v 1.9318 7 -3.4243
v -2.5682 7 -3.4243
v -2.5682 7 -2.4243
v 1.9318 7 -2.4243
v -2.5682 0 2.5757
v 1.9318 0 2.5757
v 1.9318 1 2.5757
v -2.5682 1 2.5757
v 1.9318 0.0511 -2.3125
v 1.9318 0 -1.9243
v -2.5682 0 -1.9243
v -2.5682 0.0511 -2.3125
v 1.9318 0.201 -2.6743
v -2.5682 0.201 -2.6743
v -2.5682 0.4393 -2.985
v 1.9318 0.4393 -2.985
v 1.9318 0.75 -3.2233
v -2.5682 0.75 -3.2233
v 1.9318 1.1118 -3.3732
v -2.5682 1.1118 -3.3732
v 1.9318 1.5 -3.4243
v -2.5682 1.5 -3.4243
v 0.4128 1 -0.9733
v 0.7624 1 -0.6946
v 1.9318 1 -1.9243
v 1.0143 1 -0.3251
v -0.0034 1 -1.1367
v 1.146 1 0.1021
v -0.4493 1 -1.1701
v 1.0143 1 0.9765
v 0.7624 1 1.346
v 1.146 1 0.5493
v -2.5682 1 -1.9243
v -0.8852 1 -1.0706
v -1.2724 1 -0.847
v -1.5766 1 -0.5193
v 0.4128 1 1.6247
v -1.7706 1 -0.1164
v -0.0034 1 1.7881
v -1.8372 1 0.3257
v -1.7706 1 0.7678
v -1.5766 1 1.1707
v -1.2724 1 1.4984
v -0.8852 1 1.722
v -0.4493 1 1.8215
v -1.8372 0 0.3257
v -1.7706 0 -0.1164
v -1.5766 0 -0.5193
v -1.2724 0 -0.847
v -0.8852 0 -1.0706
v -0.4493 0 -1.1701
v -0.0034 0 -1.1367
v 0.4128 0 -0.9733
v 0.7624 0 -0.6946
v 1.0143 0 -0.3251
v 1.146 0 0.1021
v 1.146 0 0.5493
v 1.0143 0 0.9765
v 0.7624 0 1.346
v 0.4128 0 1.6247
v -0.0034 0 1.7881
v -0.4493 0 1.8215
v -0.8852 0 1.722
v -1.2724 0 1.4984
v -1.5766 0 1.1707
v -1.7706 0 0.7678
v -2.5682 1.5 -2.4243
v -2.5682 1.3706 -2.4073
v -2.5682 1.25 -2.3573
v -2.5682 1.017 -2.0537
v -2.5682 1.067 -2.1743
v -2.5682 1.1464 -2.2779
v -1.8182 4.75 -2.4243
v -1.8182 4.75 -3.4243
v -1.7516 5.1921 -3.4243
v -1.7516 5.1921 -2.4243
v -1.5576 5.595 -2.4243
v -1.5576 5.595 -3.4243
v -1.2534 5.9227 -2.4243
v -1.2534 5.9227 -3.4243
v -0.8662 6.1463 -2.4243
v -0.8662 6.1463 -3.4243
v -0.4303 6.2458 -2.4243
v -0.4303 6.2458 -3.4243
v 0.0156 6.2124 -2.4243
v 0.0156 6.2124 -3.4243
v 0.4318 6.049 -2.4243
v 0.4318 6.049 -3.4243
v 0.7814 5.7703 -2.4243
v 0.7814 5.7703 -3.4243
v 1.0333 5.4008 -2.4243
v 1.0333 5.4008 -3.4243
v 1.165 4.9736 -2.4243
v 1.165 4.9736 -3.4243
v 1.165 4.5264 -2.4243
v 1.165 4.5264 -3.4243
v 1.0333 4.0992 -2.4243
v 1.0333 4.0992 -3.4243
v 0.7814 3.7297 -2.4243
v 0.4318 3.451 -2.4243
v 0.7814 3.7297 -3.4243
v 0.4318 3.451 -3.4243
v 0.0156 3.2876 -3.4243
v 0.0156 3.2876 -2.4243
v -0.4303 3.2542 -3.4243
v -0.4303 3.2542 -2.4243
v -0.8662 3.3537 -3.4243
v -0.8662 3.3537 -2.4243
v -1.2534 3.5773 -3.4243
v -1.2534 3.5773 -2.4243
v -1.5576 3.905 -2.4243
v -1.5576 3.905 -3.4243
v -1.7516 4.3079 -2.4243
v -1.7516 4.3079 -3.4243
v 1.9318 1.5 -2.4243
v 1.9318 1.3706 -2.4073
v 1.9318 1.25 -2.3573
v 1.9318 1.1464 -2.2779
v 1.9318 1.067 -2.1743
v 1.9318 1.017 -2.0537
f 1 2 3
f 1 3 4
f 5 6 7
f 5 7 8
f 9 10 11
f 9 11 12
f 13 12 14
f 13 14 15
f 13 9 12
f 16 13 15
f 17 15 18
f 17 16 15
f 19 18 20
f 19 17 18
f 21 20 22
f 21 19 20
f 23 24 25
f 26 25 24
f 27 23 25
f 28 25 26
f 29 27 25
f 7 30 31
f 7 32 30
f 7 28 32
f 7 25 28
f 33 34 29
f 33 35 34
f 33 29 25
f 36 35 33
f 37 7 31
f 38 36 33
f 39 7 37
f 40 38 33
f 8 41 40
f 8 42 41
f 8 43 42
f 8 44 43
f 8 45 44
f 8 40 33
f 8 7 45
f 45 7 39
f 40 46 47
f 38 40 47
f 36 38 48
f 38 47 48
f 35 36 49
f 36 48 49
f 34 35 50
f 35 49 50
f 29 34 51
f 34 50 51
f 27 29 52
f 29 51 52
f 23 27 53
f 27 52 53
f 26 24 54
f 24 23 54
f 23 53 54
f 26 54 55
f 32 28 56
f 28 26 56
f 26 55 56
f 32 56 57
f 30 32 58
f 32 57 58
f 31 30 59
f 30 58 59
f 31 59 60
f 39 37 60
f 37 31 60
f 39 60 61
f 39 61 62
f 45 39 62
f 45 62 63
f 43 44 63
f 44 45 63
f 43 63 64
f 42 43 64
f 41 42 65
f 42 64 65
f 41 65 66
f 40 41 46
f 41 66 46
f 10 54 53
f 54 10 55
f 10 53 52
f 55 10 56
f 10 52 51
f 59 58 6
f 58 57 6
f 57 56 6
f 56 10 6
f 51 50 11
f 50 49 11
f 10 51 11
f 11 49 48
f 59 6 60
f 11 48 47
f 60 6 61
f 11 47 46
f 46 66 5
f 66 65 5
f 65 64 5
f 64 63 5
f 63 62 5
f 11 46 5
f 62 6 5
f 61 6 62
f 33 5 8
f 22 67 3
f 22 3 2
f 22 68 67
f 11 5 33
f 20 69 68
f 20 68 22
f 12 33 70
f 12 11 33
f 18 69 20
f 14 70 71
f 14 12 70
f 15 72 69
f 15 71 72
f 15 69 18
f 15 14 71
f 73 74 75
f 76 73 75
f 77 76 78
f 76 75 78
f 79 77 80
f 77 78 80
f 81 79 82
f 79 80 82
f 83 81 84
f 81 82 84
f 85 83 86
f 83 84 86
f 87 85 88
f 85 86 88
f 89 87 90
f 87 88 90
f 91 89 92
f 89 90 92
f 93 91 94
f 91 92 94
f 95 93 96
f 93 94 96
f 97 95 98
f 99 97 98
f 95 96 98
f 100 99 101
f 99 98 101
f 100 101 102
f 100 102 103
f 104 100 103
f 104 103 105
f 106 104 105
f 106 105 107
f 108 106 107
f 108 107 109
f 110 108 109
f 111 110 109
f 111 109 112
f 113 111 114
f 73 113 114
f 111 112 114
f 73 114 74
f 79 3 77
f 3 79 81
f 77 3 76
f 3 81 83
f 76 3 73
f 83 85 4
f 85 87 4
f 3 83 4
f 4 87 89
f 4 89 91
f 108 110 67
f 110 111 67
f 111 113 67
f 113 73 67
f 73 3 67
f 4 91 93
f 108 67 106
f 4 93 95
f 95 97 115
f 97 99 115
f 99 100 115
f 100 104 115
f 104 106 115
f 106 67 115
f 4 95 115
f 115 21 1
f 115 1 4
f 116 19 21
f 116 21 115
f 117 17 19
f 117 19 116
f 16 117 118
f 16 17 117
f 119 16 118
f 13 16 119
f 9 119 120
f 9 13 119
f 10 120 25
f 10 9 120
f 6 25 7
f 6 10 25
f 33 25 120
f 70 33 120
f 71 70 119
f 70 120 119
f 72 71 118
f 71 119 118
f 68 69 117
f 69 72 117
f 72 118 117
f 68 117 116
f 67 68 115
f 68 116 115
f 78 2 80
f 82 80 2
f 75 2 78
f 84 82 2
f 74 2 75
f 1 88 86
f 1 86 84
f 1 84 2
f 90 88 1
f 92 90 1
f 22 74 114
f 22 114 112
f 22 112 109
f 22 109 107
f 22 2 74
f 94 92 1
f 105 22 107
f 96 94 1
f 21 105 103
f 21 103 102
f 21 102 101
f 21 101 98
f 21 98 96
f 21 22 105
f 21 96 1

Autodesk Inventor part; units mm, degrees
ref_plane "YZ Plane" through (0, 0, 0) normal (1, 0, 0) x (0, 1, 0)
ref_plane "XZ Plane" through (0, 0, 0) normal (0, 1, 0) x (-1, 0, 0)
ref_plane "XY Plane" through (0, 0, 0) normal (0, 0, 1) x (1, 0, 0)
sketch "Sketch1" plane through (0, 0, 0) normal (0, 1, 0) x (-1, 0, 0)
  line L0 (-1.9318, 2.5757) -> (2.5682, 2.5757)
  line L1 (2.5682, 2.5757) -> (2.5682, -3.4243)
  line L2 (2.5682, -3.4243) -> (-1.9318, -3.4243)
  line L3 (-1.9318, -3.4243) -> (-1.9318, 2.5757)
  line L4 (-1.9318, 2.5757) -> (2.5682, -3.4243) construction
  circle A0 centre (0.3372, 0.3257) radius 1.5
  point P0 (0, 0)
  dimension "d0" = 4.5
  dimension "d1" = 6
  dimension "d3" = 2.25
extrude "Extrusion1" add sketch "Sketch1" along normal blind 1
sketch "Sketch2" plane through (0, 1, 0) normal (0, 1, 0) x (1, 0, 0)
  circle A0 centre (-0.3372, -0.3257) radius 1.5 projected
  line L0 (-2.5682, -2.5757) -> (1.9318, -2.5757) projected
  line L1 (1.9318, -2.5757) -> (1.9318, 3.4243) projected
  line L2 (1.9318, 3.4243) -> (-2.5682, 3.4243) projected
  line L3 (-2.5682, 3.4243) -> (-2.5682, -2.5757) projected
  line L4 (-2.5682, 3.4243) -> (-2.5682, -2.5757) projected
  line L5 (-2.5682, 3.4243) -> (-2.5682, 2.4243)
  line L6 (-2.5682, 2.4243) -> (1.9318, 2.4243)
  line L7 (1.9318, 2.4243) -> (1.9318, 3.4243)
  line L8 (1.9318, 3.4243) -> (-2.5682, 3.4243)
  dimension "d6" = 1
extrude "Extrusion2" add sketch "Sketch2" along normal blind 6 contours L3 L2 L1 L6
fillet "Fillet1" radius 1.5 1 edges at (-0.3182, 0, -3.4243)
sketch "Sketch3" plane through (1.9318, 7, -3.4243) normal (0, 0, -1) x (-1, 0, 0)
  line L0 (4.5, -5.5) -> (0, -5.5) projected
  line L1 (4.5, -5.5) -> (4.5, 0) projected
  line L2 (0, 0) -> (4.5, 0) projected
  line L3 (0, -5.5) -> (0, 0) projected
  line L4 (2.25, 0) -> (2.25, -2.25)
  circle A0 centre (2.25, -2.25) radius 1.5
  point P0 (1.9318, -7)
  dimension "d10" = 2.25
  dimension "d11" = 3
extrude "Extrusion3" cut sketch "Sketch3" against normal blind 6 contours A0
fillet "Fillet2" radius 0.5 1 edges at (-0.3182, 1, -2.4243)
properties part number "Pixy angle bracket"
